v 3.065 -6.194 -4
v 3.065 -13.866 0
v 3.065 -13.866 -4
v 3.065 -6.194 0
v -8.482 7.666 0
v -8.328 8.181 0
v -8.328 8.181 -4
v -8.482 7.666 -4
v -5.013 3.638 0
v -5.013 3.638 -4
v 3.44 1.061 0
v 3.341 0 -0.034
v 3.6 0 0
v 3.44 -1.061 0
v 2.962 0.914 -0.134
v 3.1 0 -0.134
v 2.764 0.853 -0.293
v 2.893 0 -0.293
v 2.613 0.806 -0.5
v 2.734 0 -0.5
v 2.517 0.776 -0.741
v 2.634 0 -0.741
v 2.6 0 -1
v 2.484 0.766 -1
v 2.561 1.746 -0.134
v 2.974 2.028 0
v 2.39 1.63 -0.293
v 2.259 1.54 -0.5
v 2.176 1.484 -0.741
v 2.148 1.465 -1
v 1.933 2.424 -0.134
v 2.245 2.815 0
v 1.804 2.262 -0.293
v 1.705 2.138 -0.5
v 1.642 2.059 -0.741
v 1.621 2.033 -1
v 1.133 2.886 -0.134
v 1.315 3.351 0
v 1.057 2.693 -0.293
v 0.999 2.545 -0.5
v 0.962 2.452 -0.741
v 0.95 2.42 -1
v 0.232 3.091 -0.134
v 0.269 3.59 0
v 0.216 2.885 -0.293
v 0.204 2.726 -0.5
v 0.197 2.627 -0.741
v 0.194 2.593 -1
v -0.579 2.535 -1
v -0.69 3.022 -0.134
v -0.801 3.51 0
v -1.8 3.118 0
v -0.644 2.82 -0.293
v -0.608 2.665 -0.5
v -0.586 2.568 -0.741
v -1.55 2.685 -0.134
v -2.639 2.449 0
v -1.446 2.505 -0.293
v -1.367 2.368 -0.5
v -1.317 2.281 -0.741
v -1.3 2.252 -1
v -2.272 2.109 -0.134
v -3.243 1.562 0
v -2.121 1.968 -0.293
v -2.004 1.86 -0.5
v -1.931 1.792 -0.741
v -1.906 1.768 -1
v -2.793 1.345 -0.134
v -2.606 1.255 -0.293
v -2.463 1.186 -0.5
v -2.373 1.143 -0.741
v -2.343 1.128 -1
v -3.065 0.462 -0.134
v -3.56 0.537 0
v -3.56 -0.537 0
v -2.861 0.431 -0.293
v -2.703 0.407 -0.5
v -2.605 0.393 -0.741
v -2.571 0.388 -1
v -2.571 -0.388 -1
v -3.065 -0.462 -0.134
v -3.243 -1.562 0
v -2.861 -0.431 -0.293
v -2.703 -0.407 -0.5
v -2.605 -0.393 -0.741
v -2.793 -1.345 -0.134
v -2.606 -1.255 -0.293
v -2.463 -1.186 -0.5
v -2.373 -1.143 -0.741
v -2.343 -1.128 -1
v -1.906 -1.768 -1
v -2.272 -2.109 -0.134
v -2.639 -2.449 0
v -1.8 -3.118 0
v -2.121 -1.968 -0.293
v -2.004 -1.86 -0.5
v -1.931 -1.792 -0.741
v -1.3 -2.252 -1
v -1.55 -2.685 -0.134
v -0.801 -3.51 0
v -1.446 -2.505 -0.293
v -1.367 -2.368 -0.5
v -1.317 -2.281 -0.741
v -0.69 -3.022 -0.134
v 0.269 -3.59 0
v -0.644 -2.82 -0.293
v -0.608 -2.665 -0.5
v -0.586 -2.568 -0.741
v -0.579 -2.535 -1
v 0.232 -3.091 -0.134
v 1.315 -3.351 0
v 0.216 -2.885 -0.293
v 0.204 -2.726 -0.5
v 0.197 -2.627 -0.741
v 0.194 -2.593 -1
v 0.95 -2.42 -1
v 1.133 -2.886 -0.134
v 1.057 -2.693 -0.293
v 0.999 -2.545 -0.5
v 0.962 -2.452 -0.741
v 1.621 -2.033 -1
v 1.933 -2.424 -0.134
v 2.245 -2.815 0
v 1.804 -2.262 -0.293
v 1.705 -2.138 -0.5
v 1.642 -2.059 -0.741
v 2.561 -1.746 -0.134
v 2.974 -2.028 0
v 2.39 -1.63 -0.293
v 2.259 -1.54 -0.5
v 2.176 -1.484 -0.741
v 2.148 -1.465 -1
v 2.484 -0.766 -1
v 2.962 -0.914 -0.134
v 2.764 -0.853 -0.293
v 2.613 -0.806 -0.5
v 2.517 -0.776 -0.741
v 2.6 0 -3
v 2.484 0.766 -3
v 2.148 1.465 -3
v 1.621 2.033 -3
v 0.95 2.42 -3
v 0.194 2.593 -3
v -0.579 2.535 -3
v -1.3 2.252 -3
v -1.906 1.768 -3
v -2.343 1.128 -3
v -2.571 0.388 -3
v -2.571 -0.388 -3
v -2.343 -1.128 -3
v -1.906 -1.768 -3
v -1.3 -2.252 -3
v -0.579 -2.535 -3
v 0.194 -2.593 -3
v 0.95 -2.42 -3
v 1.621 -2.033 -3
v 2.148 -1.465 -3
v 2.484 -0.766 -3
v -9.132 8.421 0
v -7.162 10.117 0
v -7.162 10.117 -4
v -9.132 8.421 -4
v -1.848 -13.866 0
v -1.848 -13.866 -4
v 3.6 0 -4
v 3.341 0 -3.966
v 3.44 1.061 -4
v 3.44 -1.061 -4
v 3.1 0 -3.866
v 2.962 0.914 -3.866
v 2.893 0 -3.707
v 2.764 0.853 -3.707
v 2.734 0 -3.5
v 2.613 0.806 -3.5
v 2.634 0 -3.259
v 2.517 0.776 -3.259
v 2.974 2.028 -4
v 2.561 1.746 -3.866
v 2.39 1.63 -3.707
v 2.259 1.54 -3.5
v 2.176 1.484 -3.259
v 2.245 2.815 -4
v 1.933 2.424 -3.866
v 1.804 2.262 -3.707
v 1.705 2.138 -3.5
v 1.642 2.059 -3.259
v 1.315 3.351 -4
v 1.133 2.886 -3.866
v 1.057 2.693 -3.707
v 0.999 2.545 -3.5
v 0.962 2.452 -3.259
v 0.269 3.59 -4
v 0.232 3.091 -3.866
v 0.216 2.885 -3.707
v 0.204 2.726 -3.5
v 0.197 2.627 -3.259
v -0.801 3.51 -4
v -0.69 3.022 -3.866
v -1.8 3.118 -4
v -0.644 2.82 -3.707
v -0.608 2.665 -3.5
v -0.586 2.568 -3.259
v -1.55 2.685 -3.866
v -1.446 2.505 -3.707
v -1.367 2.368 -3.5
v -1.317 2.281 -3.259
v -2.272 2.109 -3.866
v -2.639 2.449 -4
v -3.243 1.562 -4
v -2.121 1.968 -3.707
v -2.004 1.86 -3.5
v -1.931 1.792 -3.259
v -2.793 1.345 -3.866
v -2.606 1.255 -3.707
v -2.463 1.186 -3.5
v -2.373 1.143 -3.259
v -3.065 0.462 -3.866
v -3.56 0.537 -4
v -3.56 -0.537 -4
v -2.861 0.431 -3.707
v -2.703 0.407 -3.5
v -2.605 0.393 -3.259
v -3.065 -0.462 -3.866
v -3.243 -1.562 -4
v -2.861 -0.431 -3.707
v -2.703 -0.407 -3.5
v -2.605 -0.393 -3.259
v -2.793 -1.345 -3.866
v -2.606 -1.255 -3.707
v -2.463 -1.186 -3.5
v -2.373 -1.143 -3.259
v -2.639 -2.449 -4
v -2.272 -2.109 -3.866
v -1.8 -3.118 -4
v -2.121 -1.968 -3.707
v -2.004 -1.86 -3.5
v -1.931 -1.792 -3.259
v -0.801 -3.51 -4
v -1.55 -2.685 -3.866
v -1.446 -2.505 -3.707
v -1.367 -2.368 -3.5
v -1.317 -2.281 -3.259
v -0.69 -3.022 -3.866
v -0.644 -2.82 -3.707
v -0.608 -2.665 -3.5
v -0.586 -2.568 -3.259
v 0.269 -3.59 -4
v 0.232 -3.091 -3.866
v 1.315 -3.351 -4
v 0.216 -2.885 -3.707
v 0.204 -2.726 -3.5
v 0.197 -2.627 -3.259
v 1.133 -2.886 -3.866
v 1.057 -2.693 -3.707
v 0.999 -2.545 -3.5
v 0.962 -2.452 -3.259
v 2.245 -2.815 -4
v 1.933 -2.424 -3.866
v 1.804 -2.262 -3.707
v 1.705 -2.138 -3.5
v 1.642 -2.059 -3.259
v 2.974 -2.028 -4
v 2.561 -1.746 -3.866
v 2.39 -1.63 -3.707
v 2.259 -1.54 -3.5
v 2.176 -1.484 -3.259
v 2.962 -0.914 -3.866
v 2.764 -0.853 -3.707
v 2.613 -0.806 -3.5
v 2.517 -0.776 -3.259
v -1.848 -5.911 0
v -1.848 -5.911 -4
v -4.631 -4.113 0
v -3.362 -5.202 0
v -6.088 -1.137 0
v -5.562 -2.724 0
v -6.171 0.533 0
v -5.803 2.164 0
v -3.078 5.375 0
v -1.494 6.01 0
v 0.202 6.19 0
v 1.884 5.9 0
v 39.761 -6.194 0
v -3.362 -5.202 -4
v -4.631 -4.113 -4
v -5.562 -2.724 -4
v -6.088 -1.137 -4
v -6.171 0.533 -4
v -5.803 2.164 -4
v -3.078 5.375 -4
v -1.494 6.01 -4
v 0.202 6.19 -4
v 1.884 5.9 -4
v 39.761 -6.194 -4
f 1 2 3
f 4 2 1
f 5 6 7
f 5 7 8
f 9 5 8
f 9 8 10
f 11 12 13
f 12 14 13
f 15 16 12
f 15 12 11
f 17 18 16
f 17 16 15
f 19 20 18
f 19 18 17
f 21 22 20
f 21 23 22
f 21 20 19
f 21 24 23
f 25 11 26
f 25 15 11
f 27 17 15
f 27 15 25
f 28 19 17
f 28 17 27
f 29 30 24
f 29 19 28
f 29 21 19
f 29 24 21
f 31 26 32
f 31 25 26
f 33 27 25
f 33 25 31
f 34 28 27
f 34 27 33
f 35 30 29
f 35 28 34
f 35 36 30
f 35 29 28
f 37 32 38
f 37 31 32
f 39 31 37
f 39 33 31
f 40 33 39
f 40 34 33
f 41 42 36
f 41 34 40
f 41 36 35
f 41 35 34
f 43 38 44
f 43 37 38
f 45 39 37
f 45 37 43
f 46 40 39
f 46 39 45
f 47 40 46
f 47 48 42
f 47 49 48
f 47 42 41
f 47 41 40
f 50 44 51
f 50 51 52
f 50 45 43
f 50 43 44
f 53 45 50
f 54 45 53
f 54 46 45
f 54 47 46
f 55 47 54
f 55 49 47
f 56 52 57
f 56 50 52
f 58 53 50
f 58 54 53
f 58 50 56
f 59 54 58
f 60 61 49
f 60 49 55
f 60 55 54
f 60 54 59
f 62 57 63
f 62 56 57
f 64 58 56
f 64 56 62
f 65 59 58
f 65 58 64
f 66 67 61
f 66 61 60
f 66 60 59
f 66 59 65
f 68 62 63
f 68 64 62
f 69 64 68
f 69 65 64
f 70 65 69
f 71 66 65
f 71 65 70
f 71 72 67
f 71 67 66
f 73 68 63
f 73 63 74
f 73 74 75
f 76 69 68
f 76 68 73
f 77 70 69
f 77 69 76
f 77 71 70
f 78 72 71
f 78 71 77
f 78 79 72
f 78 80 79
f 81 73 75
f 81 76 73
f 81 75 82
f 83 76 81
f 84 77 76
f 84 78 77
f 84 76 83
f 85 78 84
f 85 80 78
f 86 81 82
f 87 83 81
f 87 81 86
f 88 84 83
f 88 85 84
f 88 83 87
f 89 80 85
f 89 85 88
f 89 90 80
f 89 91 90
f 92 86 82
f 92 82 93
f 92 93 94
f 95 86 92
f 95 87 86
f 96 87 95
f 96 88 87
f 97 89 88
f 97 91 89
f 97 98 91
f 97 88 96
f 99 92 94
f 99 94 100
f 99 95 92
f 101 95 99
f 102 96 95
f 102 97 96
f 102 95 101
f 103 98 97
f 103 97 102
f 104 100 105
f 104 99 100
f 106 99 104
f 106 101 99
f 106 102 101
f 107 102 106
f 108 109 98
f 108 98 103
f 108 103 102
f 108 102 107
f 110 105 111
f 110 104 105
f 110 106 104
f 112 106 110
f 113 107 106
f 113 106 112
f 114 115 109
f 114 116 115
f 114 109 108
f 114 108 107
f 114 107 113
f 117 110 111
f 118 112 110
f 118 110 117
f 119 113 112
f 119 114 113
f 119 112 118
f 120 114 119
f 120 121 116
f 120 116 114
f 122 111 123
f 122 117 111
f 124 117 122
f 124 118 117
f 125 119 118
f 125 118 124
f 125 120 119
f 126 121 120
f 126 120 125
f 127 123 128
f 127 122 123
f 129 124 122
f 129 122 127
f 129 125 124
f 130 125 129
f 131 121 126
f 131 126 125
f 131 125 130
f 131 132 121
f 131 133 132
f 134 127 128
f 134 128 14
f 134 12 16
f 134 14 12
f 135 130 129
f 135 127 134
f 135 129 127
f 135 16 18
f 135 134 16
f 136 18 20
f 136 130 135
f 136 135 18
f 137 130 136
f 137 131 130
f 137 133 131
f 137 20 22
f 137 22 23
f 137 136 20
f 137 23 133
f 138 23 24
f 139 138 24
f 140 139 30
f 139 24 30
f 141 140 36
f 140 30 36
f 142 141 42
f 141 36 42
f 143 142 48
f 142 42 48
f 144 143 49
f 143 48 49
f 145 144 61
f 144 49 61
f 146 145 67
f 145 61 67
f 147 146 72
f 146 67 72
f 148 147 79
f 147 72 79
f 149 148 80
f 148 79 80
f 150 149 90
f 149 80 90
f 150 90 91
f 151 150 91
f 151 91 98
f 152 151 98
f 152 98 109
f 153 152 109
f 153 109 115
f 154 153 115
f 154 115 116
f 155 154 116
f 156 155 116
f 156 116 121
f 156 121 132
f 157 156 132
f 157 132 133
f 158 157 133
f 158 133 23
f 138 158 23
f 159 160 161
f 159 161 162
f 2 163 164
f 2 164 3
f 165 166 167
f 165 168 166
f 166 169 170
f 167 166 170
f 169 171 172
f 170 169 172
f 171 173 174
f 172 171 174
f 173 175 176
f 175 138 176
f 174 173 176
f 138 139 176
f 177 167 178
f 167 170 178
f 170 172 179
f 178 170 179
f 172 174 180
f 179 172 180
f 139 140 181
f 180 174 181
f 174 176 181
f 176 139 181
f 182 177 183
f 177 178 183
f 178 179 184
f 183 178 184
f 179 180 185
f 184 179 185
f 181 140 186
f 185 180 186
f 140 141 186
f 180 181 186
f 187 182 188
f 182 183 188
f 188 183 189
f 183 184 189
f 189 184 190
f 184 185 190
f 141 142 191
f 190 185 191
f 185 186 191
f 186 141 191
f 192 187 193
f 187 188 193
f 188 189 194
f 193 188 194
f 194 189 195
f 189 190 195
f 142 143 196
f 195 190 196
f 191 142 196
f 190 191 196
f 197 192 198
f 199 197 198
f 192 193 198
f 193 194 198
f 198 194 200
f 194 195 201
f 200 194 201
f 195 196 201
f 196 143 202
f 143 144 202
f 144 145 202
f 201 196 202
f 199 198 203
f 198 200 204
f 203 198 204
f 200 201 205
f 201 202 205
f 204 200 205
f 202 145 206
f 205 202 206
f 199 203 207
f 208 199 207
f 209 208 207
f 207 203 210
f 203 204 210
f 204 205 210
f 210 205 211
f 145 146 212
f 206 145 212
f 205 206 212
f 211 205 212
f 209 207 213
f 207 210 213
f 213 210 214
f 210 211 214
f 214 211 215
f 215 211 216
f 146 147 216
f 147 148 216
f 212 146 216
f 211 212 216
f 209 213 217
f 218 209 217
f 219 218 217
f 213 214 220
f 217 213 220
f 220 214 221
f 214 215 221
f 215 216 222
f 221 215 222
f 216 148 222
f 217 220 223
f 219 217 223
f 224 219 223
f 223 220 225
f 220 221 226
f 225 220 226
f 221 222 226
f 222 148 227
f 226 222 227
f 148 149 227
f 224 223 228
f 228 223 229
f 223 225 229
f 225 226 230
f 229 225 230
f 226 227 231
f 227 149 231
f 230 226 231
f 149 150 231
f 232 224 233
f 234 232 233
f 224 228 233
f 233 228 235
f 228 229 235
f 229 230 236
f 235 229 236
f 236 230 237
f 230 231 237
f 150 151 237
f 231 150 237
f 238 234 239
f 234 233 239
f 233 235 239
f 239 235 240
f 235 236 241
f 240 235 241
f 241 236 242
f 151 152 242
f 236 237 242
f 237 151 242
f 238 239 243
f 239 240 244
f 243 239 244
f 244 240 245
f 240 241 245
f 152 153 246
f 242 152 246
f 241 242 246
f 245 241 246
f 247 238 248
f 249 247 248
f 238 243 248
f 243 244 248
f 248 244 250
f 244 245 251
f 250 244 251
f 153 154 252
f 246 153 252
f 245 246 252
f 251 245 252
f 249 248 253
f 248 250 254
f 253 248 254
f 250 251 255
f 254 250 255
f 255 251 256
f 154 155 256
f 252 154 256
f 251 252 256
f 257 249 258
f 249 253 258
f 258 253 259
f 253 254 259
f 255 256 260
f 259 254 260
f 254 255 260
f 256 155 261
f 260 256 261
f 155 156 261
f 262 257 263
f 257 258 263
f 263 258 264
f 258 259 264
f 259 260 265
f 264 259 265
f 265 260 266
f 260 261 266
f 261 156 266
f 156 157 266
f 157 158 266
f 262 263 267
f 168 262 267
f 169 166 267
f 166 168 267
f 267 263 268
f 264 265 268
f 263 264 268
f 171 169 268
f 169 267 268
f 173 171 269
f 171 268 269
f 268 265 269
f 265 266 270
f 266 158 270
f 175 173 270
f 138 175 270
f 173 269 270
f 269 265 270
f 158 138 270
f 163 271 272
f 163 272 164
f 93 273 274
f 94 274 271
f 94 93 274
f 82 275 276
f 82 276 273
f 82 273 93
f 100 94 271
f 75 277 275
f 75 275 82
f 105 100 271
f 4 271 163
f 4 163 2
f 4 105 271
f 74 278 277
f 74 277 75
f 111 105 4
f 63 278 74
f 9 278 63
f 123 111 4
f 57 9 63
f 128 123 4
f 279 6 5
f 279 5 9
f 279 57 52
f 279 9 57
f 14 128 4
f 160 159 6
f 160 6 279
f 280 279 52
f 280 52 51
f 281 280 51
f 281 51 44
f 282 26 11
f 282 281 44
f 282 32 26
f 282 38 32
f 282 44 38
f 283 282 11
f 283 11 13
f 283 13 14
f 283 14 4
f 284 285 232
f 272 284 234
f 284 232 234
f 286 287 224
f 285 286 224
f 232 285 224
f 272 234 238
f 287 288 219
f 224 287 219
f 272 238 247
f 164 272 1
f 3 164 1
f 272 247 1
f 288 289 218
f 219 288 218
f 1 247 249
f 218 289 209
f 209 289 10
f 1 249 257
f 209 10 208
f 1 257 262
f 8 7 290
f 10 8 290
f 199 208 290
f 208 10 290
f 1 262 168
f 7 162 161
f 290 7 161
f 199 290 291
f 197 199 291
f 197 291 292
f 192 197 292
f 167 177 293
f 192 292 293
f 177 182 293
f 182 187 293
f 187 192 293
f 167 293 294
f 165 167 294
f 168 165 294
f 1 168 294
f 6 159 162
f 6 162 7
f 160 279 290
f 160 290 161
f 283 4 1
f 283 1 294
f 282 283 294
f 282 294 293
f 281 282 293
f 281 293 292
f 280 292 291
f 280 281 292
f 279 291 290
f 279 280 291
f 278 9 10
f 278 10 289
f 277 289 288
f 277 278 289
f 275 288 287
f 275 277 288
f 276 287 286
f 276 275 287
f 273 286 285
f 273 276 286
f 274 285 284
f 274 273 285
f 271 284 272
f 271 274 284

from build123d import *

# Parameters (mm, degrees)
F2_DEPTH = 4
F1_R     = 2.6
F3_DEPTH = 5
F4_R     = 1
F6_DEPTH = 4


with BuildPart() as f2:
    # F0 (on Top) → F2 (new body)
    with BuildSketch(Plane.XY):
        with BuildLine():
            Line((39.760675, -6.1935), (1.883808, 5.90006))
            ThreePointArc((1.883808, 5.90006), (-5.905721, 1.865987), (-1.848149, -5.911327))
            Line((-1.848149, -5.911327), (-1.848149, -13.865659))
            Line((-1.848149, -13.865659), (3.065253, -13.865659))
            Line((3.065253, -13.865659), (3.065253, -6.1935))
            Line((3.065253, -6.1935), (39.760675, -6.1935))
        make_face()
    extrude(amount=-F2_DEPTH)

    # F1 (on Top) → F3 (cut)
    with BuildSketch(Plane.XY):
        Circle(F1_R)
    extrude(amount=-F3_DEPTH, mode=Mode.SUBTRACT)

    # F4
    f4_edges = [f2.edges().sort_by_distance(p)[0] for p in [
        (-2.6, 0, 0),
        (-2.6, 0, -4),
    ]]
    fillet(f4_edges, radius=F4_R)

    # F5 (on Top) → F6 (join)
    with BuildSketch(Plane.XY):
        Polygon((-4.70453, 3.279649), (-3.058211, 5.351829), (-7.161808, 10.117297), (-9.131761, 8.420949), (-8.328387, 8.181407), (-8.481963, 7.666345), align=None)
    extrude(amount=-F6_DEPTH)


solid = f2.part
